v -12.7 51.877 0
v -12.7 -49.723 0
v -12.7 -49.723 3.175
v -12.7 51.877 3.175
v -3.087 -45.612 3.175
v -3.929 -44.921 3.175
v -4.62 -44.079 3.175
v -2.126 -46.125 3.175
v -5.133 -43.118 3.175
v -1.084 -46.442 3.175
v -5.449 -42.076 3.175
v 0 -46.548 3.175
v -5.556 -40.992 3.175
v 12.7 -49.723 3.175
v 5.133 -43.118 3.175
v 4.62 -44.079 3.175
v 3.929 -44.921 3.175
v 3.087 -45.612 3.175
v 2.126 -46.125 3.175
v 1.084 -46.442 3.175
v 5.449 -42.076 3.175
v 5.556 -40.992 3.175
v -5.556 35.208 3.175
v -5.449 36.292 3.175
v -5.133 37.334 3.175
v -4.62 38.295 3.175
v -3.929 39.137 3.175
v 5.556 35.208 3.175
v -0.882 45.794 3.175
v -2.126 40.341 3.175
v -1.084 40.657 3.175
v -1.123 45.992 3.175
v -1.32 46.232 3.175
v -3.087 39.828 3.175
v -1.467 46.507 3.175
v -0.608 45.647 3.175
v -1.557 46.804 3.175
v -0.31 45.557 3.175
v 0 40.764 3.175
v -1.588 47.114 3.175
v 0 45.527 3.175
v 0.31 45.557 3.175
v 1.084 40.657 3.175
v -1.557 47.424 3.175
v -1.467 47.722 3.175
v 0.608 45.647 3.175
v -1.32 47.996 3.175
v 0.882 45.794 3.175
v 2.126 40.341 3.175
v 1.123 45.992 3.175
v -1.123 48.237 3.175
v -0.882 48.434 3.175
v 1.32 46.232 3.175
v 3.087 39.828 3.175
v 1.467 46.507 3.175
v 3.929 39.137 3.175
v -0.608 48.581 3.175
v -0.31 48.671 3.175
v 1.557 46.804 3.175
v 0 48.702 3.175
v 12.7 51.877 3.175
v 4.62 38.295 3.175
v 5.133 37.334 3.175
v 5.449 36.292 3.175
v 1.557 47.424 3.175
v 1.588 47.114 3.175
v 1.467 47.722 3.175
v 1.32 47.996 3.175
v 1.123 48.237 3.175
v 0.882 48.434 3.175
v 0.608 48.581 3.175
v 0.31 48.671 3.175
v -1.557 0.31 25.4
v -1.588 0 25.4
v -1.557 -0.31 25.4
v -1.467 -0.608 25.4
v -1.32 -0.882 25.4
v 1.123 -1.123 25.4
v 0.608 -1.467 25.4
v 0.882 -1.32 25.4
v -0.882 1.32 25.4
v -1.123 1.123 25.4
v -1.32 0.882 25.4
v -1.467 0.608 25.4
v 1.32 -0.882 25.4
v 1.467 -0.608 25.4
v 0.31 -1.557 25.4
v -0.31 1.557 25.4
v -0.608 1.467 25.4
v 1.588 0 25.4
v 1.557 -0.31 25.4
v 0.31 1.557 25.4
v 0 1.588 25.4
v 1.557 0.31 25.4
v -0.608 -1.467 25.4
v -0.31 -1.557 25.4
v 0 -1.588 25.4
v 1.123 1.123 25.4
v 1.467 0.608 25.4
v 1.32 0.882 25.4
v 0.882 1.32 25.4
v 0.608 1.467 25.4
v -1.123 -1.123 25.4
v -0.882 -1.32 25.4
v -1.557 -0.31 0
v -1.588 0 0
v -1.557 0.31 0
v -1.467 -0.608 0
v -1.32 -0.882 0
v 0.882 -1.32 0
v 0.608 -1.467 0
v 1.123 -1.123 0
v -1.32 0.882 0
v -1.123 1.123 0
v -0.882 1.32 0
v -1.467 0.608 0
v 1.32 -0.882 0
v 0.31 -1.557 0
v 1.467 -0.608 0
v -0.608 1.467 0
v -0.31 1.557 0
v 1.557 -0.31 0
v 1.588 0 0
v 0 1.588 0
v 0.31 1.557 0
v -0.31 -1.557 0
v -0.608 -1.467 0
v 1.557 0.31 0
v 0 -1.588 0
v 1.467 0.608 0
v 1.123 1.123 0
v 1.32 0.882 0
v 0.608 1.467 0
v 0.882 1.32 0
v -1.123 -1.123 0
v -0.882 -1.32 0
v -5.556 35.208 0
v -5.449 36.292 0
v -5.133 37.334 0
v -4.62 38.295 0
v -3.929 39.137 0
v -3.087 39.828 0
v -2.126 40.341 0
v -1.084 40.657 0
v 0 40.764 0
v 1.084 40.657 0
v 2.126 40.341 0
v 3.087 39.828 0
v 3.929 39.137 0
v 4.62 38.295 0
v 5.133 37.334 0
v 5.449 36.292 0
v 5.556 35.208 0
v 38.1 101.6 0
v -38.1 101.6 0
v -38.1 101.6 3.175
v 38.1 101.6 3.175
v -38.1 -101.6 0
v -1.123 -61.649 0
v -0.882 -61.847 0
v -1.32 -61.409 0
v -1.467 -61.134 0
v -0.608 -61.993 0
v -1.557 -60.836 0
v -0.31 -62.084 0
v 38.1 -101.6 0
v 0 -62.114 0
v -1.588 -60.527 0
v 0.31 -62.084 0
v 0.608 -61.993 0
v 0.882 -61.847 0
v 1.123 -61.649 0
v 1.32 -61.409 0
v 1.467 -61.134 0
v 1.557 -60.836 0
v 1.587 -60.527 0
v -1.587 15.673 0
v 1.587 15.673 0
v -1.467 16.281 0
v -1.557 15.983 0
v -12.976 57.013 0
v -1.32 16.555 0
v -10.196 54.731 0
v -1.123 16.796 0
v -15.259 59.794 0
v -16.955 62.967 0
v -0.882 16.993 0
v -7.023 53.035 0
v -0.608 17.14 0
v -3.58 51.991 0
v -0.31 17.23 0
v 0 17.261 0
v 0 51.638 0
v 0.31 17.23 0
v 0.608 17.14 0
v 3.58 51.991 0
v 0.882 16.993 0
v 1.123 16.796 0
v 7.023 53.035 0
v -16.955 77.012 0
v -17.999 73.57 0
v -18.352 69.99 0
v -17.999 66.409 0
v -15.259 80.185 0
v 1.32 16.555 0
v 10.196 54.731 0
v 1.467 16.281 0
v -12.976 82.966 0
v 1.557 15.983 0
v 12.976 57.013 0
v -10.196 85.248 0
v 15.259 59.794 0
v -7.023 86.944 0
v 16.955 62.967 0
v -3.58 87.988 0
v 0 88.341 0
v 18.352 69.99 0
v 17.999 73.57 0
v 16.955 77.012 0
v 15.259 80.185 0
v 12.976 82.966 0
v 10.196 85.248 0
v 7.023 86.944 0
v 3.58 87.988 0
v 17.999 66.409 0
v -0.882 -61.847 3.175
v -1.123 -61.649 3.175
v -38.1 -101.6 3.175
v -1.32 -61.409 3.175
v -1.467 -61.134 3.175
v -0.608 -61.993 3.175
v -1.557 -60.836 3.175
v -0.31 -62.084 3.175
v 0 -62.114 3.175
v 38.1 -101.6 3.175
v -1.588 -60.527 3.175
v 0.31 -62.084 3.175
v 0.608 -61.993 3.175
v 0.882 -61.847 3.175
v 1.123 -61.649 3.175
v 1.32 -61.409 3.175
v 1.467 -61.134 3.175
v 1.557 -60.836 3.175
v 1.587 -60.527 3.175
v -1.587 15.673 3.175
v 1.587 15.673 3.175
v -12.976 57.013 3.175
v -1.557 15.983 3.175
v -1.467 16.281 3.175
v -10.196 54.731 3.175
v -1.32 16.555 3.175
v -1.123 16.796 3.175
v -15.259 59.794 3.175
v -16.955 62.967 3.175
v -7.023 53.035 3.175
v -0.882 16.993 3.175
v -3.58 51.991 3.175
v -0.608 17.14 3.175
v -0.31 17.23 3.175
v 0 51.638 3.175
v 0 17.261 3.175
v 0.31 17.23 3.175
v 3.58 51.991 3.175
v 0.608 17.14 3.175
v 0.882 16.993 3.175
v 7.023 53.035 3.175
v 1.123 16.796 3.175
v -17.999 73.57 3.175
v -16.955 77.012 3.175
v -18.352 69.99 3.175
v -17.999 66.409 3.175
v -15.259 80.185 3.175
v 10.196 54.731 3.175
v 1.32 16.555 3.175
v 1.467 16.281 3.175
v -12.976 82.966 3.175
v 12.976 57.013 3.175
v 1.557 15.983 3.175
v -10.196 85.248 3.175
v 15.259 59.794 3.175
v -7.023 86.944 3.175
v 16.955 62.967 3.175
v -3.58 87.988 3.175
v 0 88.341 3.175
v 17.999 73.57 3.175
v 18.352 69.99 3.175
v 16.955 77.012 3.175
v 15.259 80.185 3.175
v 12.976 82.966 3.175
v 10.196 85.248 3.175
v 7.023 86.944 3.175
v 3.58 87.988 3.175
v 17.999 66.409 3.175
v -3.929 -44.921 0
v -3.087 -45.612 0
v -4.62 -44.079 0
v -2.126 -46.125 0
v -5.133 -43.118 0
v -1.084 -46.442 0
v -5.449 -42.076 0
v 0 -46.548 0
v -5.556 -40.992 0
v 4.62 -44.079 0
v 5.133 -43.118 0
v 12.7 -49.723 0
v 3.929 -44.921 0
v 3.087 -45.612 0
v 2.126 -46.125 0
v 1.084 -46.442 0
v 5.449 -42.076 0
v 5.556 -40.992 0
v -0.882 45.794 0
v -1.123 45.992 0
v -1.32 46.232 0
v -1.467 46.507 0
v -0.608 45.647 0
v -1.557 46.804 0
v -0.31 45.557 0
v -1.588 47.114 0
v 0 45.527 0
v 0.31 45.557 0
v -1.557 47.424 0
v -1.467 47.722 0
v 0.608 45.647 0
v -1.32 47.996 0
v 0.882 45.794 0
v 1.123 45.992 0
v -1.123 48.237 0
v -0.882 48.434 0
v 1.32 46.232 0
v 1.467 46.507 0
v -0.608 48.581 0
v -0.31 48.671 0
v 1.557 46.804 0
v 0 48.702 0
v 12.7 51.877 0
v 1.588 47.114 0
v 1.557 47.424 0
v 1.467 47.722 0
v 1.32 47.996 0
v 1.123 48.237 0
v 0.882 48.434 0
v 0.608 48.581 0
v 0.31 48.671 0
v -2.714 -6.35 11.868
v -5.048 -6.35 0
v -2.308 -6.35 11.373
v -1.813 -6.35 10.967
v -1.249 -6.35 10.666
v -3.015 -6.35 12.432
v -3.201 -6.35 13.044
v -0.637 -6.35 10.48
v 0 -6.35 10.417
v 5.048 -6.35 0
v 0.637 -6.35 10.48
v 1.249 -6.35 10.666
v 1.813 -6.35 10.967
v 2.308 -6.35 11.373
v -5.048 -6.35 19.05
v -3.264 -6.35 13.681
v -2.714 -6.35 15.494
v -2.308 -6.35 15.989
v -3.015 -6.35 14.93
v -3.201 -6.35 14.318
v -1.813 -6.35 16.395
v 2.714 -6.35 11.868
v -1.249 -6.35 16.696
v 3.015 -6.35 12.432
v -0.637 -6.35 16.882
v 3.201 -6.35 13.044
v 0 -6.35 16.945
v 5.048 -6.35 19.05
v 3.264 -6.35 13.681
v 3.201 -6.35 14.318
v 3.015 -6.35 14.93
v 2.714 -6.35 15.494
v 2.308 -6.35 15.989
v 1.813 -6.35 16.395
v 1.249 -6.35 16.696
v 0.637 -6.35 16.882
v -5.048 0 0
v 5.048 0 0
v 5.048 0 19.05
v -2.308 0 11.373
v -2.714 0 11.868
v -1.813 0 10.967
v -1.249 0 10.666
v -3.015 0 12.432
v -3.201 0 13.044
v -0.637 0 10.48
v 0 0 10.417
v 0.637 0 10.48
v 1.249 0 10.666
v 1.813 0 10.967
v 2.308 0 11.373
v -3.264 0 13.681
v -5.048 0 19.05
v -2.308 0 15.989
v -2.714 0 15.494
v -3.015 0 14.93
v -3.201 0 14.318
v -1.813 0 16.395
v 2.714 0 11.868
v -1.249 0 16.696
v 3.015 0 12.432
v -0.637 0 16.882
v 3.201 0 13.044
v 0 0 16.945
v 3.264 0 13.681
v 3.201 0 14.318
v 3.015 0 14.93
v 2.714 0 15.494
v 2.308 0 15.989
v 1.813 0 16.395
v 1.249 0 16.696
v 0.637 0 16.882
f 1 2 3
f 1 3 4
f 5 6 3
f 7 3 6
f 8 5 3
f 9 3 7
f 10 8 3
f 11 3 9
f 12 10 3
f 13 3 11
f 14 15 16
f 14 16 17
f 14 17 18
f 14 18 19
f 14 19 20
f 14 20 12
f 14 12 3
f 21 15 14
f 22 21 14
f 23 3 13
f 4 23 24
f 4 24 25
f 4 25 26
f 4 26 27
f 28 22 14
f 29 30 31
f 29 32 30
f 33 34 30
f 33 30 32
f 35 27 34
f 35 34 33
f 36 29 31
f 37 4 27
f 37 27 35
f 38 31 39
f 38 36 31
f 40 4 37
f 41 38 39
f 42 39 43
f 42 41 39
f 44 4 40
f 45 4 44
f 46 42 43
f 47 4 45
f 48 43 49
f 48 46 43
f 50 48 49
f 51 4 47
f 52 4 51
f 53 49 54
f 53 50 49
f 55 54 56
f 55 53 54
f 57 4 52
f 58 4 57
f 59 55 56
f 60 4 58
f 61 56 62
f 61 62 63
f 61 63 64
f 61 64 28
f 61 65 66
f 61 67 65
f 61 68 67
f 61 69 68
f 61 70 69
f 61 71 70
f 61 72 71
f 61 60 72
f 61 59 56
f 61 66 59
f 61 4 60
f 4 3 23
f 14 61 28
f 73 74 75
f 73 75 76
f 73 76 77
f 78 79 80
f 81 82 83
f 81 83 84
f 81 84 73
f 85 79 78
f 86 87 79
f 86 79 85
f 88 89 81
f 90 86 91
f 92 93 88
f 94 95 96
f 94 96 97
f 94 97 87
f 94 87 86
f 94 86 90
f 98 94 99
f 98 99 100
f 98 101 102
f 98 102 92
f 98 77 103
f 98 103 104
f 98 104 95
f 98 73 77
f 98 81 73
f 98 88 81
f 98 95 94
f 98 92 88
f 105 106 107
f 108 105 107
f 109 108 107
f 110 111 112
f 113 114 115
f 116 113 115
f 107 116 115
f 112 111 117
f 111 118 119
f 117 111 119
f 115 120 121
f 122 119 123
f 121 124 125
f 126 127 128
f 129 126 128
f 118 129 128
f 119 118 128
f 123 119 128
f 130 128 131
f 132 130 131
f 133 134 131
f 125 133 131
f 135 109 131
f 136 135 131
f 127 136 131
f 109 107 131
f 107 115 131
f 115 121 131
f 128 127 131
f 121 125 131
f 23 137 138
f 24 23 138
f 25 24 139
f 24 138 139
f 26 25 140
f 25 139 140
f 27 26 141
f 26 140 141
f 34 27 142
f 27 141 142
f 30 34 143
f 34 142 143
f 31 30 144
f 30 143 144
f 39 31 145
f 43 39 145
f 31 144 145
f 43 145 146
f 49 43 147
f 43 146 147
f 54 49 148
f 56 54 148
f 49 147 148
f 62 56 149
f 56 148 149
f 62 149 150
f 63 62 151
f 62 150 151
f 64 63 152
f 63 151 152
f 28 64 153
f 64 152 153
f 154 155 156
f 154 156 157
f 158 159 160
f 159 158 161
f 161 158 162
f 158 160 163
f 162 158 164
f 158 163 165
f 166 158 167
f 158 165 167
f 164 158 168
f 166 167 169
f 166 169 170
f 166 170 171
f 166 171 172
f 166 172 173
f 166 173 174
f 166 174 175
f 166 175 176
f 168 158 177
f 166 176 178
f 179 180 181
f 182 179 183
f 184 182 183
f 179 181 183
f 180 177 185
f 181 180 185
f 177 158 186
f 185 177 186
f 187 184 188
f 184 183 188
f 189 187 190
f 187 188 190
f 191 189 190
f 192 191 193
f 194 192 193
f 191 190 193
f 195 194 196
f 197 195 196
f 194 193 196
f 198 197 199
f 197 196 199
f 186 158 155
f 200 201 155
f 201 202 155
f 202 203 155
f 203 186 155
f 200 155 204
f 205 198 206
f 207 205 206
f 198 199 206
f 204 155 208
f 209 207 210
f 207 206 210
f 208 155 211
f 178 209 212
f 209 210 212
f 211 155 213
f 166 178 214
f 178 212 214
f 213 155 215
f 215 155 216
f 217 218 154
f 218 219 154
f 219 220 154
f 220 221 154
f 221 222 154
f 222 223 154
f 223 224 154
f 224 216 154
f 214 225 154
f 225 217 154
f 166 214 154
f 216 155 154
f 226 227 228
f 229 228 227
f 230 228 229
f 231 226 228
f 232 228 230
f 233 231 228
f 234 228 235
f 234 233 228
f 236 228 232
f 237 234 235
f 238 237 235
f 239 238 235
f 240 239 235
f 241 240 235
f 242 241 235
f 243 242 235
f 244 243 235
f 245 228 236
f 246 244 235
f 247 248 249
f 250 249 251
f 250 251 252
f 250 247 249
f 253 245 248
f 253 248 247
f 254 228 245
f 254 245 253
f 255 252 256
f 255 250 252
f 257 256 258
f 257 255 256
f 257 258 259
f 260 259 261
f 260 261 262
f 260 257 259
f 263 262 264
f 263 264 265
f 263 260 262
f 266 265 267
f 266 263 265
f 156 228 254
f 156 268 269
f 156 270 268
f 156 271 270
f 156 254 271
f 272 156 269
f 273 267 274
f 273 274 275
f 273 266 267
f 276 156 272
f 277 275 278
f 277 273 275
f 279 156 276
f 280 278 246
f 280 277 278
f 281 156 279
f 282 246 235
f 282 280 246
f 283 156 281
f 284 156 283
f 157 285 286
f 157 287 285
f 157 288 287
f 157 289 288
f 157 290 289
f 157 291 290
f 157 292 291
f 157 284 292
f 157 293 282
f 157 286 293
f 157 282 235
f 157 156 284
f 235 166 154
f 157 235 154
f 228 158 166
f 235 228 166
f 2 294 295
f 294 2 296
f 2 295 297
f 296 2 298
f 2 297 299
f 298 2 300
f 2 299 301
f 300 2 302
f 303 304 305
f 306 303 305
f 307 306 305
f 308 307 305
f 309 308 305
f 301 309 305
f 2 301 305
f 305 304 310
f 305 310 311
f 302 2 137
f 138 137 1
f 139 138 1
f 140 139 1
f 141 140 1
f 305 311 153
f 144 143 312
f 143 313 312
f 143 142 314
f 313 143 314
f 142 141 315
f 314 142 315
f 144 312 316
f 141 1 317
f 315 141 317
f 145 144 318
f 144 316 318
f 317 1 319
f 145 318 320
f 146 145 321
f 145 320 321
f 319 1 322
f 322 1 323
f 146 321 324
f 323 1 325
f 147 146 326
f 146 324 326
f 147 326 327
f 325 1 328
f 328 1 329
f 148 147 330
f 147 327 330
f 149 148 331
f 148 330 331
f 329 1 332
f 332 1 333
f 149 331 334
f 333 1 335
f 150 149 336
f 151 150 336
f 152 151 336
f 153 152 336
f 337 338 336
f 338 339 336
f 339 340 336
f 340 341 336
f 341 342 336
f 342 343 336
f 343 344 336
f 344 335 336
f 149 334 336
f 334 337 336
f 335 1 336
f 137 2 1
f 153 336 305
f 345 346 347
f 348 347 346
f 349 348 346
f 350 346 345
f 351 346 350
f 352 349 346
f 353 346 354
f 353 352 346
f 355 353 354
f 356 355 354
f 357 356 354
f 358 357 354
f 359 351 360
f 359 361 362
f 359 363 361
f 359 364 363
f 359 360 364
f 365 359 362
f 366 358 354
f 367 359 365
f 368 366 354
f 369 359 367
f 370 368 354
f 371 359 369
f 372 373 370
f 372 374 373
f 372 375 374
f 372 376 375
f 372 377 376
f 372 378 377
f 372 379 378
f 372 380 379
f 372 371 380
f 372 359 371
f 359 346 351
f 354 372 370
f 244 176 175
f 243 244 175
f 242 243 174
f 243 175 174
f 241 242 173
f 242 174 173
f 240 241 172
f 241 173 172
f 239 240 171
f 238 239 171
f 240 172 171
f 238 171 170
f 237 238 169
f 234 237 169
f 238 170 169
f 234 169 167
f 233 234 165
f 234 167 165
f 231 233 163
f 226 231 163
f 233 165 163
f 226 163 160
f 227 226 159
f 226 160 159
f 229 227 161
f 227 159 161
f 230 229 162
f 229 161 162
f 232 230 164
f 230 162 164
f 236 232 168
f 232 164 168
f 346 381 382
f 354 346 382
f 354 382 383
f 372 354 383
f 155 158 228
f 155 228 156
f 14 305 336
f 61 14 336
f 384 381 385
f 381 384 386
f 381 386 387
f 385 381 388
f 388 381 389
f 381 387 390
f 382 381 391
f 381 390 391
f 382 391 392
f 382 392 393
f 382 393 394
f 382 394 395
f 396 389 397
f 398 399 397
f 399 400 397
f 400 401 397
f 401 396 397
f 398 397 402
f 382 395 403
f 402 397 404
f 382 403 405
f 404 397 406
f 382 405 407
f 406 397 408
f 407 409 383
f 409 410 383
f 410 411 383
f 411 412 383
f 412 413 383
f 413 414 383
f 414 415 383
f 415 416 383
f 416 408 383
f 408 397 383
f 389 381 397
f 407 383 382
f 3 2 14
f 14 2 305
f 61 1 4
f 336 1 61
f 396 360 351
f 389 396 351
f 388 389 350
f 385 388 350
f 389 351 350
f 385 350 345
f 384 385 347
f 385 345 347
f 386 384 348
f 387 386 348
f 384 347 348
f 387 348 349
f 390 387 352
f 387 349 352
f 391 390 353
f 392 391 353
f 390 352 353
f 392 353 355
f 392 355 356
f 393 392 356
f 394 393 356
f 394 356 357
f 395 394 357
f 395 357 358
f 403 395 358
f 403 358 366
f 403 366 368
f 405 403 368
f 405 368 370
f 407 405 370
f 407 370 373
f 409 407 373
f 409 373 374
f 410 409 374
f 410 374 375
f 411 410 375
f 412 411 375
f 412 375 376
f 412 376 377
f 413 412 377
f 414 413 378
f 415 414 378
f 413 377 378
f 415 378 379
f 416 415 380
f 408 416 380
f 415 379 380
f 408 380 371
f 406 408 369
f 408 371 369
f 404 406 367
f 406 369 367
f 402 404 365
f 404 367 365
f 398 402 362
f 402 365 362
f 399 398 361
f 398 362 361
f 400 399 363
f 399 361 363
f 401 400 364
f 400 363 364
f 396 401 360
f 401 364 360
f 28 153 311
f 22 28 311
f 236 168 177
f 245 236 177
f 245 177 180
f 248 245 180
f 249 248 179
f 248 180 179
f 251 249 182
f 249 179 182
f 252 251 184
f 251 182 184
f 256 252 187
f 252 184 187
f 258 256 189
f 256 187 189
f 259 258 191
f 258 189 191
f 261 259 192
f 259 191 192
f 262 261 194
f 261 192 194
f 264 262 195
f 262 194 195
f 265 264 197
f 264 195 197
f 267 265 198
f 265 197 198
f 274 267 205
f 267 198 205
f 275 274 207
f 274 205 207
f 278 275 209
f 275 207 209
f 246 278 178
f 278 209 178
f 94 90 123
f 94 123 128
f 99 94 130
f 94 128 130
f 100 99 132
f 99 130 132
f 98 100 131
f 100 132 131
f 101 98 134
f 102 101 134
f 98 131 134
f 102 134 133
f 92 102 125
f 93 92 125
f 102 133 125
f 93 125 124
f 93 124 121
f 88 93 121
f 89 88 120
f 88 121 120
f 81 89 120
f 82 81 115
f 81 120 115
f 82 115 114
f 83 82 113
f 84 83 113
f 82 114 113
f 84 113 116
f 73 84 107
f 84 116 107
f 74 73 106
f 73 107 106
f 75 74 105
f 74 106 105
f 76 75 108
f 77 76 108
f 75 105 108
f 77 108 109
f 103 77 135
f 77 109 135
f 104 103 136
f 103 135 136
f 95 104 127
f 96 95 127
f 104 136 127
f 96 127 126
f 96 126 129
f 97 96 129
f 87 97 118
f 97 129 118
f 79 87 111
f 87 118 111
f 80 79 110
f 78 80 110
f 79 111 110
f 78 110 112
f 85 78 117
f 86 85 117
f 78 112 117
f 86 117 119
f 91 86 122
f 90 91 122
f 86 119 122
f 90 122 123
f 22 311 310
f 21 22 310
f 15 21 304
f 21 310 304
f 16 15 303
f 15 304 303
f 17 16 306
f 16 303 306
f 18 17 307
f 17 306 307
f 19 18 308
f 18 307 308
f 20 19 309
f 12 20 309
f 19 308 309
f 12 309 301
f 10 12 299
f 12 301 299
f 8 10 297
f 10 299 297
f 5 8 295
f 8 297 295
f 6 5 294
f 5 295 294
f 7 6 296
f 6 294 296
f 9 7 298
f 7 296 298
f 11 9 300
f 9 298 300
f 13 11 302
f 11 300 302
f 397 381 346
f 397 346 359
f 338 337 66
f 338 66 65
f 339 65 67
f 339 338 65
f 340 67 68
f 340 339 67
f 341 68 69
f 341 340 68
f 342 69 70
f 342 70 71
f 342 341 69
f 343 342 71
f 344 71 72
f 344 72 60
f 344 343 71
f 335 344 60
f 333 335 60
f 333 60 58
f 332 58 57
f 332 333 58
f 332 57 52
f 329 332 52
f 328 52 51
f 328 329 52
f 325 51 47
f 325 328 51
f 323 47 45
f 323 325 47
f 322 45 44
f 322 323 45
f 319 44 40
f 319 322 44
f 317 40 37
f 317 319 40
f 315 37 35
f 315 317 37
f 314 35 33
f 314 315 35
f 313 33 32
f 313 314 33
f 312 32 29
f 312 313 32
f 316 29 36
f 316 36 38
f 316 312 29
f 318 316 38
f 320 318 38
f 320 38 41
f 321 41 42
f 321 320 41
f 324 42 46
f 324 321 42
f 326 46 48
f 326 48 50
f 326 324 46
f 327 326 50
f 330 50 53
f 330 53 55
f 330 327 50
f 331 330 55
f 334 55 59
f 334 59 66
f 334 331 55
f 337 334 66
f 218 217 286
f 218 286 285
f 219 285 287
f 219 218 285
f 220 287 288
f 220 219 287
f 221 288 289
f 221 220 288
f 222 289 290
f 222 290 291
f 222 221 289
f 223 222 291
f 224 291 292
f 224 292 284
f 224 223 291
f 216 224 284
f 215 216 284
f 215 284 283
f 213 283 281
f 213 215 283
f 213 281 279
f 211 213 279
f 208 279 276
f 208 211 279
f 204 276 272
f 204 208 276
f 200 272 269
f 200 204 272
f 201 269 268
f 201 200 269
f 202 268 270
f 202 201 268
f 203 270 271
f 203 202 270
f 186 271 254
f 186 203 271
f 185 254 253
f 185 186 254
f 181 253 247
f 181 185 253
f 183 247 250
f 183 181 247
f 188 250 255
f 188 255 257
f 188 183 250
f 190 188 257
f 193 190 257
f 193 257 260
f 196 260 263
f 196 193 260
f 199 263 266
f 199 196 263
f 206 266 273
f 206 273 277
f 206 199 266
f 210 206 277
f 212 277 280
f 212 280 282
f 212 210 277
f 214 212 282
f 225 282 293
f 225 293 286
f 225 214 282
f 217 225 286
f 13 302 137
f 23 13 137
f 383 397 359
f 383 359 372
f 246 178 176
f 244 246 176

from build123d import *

# Parameters (mm, degrees)
F0_W     = 76.2
F0_H     = 203.2
F0_R     = 18.3515
F1_DEPTH = 3.175
F2_W     = 25.4
F2_H     = 101.6
F2_R     = 1.5875
F3_DEPTH = 3.175
F4_R     = 1.5875
F5_DEPTH = 25.4
F6_W     = 10.0965
F6_H     = 19.05
F7_DEPTH = 6.35
F8_D     = 6.5278


with BuildPart() as f1:
    # F0 (on Top) → F1 (new body)
    with BuildSketch(Plane.XY):
        Rectangle(F0_W, F0_H)
        with BuildLine():
            ThreePointArc((-1.5875, 15.673443675), (0, 17.260943675), (1.5875, 15.673443675))
            Line((1.5875, 15.673443675), (1.5875, -60.526556325))
            ThreePointArc((1.5875, -60.526556325), (0, -62.114056325), (-1.5875, -60.526556325))
            Line((-1.5875, -60.526556325), (-1.5875, 15.673443675))
        make_face(mode=Mode.SUBTRACT)
        with Locations((0, 69.9895162783)):
            Circle(F0_R, mode=Mode.SUBTRACT)
    extrude(amount=F1_DEPTH)


with BuildPart() as f3:
    # F2 (on Top) → F3 (new body)
    with BuildSketch(Plane.XY):
        with Locations((0, 1.0766318619)):
            Rectangle(F2_W, F2_H)
        with BuildLine():
            ThreePointArc((-5.55625, 35.2078818619), (0, 40.7641318619), (5.55625, 35.2078818619))
            Line((5.55625, 35.2078818619), (5.55625, -40.9921181381))
            ThreePointArc((5.55625, -40.9921181381), (0, -46.5483681381), (-5.55625, -40.9921181381))
            Line((-5.55625, -40.9921181381), (-5.55625, 35.2078818619))
        make_face(mode=Mode.SUBTRACT)
        with Locations((0, 47.1141318619)):
            Circle(F2_R, mode=Mode.SUBTRACT)
    extrude(amount=F3_DEPTH)


with BuildPart() as f5:
    # F4 (on Top) → F5 (new body)
    with BuildSketch(Plane.XY):
        Circle(F4_R)
    extrude(amount=F5_DEPTH)


with BuildPart() as f7:
    # F6 (on Front) → F7 (new body)
    with BuildSketch(Plane.XZ):
        with Locations((0, 9.525)):
            Rectangle(F6_W, F6_H)
    extrude(amount=F7_DEPTH)

    # F8 (through all)
    with Locations(Plane(origin=(0, 0, 0), x_dir=(1, 0, 0), z_dir=(0, 1, 0))):
        with Locations((0, -13.6809640511)):
            Hole(F8_D / 2)


solid = Compound([f1.part, f3.part, f5.part, f7.part])
